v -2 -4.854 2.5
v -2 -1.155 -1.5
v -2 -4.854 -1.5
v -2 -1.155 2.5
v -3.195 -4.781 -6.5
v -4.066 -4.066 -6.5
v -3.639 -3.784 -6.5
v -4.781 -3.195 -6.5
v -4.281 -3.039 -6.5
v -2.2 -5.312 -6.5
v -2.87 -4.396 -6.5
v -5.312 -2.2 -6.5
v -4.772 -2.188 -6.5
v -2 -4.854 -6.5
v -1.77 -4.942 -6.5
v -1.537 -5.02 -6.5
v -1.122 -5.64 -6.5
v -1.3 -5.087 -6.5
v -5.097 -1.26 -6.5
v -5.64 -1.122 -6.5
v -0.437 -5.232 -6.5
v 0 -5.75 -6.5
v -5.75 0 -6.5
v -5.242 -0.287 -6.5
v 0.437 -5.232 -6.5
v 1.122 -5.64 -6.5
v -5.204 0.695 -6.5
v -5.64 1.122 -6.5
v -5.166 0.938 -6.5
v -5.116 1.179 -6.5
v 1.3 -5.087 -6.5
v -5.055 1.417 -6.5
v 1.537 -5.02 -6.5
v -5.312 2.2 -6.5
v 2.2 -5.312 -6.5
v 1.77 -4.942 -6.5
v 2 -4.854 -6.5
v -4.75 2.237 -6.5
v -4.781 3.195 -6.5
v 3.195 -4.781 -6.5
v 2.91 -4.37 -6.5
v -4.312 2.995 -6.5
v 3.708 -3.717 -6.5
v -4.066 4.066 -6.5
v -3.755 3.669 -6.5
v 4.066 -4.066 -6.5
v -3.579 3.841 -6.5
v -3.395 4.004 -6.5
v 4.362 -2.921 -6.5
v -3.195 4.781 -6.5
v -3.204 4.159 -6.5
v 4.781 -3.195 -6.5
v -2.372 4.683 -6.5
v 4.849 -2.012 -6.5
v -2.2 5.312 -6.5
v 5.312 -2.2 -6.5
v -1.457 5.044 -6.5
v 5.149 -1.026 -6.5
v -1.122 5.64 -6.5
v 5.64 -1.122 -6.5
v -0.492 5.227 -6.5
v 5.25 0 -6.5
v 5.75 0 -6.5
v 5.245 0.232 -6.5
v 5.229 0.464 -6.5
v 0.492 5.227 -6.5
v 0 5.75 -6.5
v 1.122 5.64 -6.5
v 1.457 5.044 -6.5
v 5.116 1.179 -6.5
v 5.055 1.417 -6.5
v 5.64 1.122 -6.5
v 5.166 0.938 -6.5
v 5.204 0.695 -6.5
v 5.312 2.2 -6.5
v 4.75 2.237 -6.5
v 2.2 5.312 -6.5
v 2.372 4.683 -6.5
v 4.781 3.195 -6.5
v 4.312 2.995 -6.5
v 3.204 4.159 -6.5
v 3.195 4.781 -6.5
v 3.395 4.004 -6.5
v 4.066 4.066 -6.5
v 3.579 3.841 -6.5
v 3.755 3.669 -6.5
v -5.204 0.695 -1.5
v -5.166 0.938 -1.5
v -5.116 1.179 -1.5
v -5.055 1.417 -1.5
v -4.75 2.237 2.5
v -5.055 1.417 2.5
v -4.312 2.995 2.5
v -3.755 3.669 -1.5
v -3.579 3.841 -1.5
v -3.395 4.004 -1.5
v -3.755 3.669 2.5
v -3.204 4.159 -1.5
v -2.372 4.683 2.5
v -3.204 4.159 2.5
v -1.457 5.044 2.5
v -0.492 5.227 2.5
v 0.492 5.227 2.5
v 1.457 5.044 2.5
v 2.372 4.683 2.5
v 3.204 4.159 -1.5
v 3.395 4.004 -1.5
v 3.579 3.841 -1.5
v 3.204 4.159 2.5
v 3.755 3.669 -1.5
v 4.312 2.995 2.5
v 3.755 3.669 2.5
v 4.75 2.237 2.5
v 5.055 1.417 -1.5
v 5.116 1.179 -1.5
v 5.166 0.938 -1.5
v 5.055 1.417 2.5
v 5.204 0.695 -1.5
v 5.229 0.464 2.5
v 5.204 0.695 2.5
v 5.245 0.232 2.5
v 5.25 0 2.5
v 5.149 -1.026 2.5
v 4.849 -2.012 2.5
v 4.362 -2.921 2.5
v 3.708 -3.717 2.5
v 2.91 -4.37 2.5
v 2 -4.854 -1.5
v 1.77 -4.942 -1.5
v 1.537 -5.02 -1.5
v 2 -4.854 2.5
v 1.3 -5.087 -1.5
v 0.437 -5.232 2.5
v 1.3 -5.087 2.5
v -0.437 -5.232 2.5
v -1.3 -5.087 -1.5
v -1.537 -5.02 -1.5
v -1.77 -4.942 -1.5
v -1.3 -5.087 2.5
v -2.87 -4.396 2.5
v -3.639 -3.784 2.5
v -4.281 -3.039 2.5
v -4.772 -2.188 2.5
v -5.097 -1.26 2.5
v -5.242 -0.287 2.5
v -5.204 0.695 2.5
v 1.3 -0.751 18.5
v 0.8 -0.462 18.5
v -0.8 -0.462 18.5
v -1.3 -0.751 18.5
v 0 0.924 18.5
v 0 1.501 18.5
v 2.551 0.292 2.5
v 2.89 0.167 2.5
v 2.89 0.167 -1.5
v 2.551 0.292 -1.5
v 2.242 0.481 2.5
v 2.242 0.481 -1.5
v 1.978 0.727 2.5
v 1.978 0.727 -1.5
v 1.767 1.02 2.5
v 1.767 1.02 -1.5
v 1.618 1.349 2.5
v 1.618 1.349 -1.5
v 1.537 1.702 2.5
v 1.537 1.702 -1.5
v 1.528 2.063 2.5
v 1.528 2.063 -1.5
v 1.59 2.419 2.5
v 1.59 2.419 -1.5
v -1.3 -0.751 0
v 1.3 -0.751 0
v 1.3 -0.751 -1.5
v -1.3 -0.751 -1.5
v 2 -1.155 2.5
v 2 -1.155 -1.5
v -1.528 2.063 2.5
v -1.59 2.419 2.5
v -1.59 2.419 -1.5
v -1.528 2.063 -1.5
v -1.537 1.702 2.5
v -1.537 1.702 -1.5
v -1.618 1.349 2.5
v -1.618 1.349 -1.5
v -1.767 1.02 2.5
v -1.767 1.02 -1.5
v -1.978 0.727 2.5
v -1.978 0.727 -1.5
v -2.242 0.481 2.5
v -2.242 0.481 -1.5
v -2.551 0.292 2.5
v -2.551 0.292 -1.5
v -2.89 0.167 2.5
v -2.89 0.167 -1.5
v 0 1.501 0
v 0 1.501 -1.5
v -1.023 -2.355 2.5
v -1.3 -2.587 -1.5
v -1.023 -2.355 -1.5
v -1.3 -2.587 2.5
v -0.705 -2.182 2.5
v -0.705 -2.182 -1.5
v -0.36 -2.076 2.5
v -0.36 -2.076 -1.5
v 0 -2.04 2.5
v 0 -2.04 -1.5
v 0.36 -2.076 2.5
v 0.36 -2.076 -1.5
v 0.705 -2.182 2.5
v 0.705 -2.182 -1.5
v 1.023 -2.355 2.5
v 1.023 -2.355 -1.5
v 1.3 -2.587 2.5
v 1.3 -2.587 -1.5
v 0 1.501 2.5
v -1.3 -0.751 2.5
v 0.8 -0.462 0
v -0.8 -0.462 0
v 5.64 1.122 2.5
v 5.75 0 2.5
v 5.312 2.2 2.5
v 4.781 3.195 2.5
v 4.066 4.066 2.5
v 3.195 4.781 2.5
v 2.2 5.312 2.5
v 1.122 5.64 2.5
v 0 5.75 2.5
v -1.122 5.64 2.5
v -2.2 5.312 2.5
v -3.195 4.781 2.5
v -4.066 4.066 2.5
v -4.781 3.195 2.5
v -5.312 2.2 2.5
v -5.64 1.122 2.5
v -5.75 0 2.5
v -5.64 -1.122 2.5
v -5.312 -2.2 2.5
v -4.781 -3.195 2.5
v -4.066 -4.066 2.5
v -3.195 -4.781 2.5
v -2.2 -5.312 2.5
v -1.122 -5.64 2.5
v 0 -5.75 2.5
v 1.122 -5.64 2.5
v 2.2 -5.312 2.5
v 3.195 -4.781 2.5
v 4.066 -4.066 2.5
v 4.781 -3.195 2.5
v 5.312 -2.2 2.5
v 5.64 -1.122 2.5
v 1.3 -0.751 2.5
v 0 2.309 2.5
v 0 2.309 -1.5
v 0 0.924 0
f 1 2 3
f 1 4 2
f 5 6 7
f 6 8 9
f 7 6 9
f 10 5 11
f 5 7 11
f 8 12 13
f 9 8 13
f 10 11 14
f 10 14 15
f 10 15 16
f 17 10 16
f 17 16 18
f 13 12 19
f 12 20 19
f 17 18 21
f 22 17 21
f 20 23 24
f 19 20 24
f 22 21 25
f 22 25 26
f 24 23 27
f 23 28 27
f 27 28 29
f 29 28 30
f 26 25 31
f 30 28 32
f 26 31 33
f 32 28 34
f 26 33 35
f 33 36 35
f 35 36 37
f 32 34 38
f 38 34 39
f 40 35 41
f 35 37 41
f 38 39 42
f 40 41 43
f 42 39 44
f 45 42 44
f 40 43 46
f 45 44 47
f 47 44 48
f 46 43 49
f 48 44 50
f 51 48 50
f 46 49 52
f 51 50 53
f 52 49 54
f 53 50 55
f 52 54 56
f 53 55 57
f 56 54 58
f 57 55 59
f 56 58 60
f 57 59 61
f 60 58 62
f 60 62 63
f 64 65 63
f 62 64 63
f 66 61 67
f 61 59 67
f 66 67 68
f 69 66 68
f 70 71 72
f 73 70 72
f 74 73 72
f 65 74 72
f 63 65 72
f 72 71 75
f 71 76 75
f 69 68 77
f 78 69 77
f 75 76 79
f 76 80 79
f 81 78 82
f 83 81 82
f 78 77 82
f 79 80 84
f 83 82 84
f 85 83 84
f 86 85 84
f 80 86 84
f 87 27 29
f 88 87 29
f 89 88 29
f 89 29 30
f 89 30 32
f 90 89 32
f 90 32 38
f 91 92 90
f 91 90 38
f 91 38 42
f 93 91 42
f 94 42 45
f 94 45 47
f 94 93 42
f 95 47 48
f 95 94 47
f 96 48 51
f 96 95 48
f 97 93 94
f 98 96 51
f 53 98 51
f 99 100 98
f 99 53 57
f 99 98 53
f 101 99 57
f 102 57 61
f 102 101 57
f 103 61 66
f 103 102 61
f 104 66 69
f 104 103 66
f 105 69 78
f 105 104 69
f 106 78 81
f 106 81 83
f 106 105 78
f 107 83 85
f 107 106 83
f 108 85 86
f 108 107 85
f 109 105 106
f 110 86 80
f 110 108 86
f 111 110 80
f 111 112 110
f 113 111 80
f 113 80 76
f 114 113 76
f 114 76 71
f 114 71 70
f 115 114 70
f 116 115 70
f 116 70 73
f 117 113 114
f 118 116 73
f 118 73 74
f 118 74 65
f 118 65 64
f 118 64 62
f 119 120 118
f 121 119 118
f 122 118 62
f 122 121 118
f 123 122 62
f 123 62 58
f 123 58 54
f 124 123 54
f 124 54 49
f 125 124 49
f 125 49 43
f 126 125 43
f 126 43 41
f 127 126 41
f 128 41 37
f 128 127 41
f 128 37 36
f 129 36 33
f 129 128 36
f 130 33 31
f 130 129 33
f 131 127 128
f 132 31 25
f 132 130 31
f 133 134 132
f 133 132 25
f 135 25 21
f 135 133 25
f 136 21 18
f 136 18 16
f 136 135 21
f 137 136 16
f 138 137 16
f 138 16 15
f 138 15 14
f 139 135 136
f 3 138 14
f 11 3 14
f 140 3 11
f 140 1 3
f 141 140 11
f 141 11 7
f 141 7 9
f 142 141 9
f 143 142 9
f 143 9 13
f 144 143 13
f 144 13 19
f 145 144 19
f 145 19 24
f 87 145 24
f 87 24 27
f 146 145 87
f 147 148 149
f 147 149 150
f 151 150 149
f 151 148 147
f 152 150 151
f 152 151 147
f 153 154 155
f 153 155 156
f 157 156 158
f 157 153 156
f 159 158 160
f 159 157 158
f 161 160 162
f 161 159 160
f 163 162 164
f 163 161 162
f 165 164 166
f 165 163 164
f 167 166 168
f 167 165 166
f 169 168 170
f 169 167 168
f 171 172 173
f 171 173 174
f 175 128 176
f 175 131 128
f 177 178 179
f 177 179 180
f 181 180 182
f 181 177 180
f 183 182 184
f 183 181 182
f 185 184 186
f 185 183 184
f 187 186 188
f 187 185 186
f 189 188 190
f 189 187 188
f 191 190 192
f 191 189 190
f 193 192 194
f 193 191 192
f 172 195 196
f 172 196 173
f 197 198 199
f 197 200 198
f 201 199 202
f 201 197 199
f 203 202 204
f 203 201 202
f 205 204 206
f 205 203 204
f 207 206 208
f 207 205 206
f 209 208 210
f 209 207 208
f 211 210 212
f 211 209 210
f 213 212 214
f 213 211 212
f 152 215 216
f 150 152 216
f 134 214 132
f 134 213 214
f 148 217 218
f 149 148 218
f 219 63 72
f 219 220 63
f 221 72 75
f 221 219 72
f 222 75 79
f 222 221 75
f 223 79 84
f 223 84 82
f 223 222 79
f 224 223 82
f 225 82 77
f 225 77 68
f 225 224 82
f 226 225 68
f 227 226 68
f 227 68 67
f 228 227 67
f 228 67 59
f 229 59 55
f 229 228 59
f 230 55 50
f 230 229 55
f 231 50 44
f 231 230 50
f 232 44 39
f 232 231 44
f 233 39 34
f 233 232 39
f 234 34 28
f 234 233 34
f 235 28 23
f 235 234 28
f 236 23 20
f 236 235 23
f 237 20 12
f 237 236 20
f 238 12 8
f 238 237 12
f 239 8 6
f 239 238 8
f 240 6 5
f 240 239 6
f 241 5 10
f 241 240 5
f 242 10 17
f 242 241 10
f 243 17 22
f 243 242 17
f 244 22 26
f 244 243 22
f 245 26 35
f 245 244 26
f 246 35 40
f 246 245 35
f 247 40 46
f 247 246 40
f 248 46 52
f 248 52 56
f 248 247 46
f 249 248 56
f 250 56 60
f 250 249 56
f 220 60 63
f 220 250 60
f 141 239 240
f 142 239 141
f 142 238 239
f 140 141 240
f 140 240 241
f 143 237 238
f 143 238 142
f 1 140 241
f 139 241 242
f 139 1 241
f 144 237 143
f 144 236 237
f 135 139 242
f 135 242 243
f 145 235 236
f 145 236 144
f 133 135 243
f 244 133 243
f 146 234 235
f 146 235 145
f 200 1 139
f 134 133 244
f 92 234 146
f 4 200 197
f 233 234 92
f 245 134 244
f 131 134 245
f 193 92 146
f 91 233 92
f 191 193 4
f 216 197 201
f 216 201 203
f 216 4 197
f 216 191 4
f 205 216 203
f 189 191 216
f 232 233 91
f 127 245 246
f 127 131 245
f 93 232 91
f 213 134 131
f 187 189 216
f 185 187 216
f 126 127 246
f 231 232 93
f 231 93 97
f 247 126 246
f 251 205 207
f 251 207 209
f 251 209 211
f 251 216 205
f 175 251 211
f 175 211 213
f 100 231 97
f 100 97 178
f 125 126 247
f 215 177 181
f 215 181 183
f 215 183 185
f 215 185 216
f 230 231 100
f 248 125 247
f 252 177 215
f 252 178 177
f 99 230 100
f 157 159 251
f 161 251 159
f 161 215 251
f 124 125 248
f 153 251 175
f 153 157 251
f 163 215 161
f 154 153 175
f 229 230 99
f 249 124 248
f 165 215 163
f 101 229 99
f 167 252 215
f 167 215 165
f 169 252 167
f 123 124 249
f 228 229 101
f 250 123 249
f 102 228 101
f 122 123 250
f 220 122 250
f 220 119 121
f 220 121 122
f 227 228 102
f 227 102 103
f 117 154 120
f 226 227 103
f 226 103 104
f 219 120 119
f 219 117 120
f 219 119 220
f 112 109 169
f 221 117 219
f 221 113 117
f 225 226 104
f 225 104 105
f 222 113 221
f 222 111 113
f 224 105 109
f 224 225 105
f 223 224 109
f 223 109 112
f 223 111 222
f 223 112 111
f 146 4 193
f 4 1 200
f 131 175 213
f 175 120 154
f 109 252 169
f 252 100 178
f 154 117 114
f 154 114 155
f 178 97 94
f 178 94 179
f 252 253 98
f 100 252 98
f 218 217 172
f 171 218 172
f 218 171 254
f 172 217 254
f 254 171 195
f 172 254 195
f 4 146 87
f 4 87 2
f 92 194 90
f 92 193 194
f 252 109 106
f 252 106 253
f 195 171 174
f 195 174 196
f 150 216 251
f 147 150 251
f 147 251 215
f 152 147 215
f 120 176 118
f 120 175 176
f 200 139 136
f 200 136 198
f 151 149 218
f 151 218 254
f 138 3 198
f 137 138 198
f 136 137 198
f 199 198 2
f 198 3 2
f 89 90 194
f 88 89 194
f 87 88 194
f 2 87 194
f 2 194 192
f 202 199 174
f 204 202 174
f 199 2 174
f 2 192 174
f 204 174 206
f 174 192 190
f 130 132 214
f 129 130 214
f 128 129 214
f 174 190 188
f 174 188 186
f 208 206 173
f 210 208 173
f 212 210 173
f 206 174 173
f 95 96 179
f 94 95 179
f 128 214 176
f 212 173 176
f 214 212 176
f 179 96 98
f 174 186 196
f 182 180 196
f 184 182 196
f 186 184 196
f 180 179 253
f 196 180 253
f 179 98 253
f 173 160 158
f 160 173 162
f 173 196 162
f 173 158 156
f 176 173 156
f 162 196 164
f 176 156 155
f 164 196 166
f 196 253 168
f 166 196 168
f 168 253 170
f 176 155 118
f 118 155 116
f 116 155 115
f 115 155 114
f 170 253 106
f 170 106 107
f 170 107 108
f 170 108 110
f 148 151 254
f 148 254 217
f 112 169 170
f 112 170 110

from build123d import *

# Parameters (mm, degrees)
F0_R     = 5.75
F1_DEPTH = 2.5
F2_DEPTH = 18.5
F3_DEPTH = 6.5
F4_DEPTH = 1.5


with BuildPart() as f1:
    # F0 (on Top) → F1 (new body)
    with BuildSketch(Plane.XY):
        Circle(F0_R)
        with BuildLine():
            ThreePointArc((5.2037929302, 0.6950101723), (5.2384354956, 0.3482722473), (5.25, 0))
            ThreePointArc((5.25, 0), (4.3624820917, -2.9208303614), (2, -4.8541219597))
            ThreePointArc((2, -4.8541219597), (1.6540858778, -4.9826197837), (1.3, -5.0865017448))
            ThreePointArc((1.3, -5.0865017448), (0, -5.25), (-1.3, -5.0865017448))
            ThreePointArc((-1.3, -5.0865017448), (-1.6540858778, -4.9826197837), (-2, -4.8541219597))
            ThreePointArc((-2, -4.8541219597), (-4.5466333699, -2.625), (-5.2037929302, 0.6950101723))
            ThreePointArc((-5.2037929302, 0.6950101723), (-5.142118249, 1.0588295016), (-5.0550397274, 1.4174178475))
            ThreePointArc((-5.0550397274, 1.4174178475), (-4.5466333699, 2.625), (-3.7550397274, 3.6690838973))
            ThreePointArc((-3.7550397274, 3.6690838973), (-3.4880323712, 3.9237902821), (-3.2037929302, 4.1591117874))
            ThreePointArc((-3.2037929302, 4.1591117874), (0, 5.25), (3.2037929302, 4.1591117874))
            ThreePointArc((3.2037929302, 4.1591117874), (3.4880323712, 3.9237902821), (3.7550397274, 3.6690838973))
            ThreePointArc((3.7550397274, 3.6690838973), (4.5466333699, 2.625), (5.0550397274, 1.4174178475))
            ThreePointArc((5.0550397274, 1.4174178475), (5.142118249, 1.0588295016), (5.2037929302, 0.6950101723))
        make_face(mode=Mode.SUBTRACT)
        with BuildLine():
            Line((2, -1.1547005384), (5.2037929302, 0.6950101723))
            ThreePointArc((5.2037929302, 0.6950101723), (5.142118249, 1.0588295016), (5.0550397274, 1.4174178475))
            Line((5.0550397274, 1.4174178475), (2.8899762179, 0.1674178475))
            ThreePointArc((2.8899762179, 0.1674178475), (1.7668965617, 1.0201182055), (1.5899762179, 2.4190838973))
            Line((1.5899762179, 2.4190838973), (3.7550397274, 3.6690838973))
            ThreePointArc((3.7550397274, 3.6690838973), (3.4880323712, 3.9237902821), (3.2037929302, 4.1591117874))
            Line((3.2037929302, 4.1591117874), (0, 2.3094010768))
            Line((0, 2.3094010768), (-3.2037929302, 4.1591117874))
            ThreePointArc((-3.2037929302, 4.1591117874), (-3.4880323712, 3.9237902821), (-3.7550397274, 3.6690838973))
            Line((-3.7550397274, 3.6690838973), (-1.5899762179, 2.4190838973))
            ThreePointArc((-1.5899762179, 2.4190838973), (-1.7668965617, 1.0201182055), (-2.8899762179, 0.1674178475))
            Line((-2.8899762179, 0.1674178475), (-5.0550397274, 1.4174178475))
            ThreePointArc((-5.0550397274, 1.4174178475), (-5.142118249, 1.0588295016), (-5.2037929302, 0.6950101723))
            Line((-5.2037929302, 0.6950101723), (-2, -1.1547005384))
            Line((-2, -1.1547005384), (-2, -4.8541219597))
            ThreePointArc((-2, -4.8541219597), (-1.6540858778, -4.9826197837), (-1.3, -5.0865017448))
            Line((-1.3, -5.0865017448), (-1.3, -2.5865017448))
            ThreePointArc((-1.3, -2.5865017448), (0, -2.0402364111), (1.3, -2.5865017448))
            Line((1.3, -2.5865017448), (1.3, -5.0865017448))
            ThreePointArc((1.3, -5.0865017448), (1.6540858778, -4.9826197837), (2, -4.8541219597))
            Line((2, -4.8541219597), (2, -1.1547005384))
        make_face()
        Polygon((-1.3, -0.7505553499), (0, 1.5011106999), (1.3, -0.7505553499), align=None, mode=Mode.SUBTRACT)
    extrude(amount=F1_DEPTH)

    # F0 (on Top) → F2 (join)
    with BuildSketch(Plane.XY):
        Polygon((1.3, -0.7505553499), (0, 1.5011106999), (-1.3, -0.7505553499), align=None)
        Polygon((-0.8, -0.4618802154), (0, 0.9237604307), (0.8, -0.4618802154), align=None, mode=Mode.SUBTRACT)
    extrude(amount=F2_DEPTH)

    # F0 (on Top) → F3 (join)
    with BuildSketch(Plane.XY):
        Circle(F0_R)
        with BuildLine():
            ThreePointArc((5.2037929302, 0.6950101723), (5.2384354956, 0.3482722473), (5.25, 0))
            ThreePointArc((5.25, 0), (4.3624820917, -2.9208303614), (2, -4.8541219597))
            ThreePointArc((2, -4.8541219597), (1.6540858778, -4.9826197837), (1.3, -5.0865017448))
            ThreePointArc((1.3, -5.0865017448), (0, -5.25), (-1.3, -5.0865017448))
            ThreePointArc((-1.3, -5.0865017448), (-1.6540858778, -4.9826197837), (-2, -4.8541219597))
            ThreePointArc((-2, -4.8541219597), (-4.5466333699, -2.625), (-5.2037929302, 0.6950101723))
            ThreePointArc((-5.2037929302, 0.6950101723), (-5.142118249, 1.0588295016), (-5.0550397274, 1.4174178475))
            ThreePointArc((-5.0550397274, 1.4174178475), (-4.5466333699, 2.625), (-3.7550397274, 3.6690838973))
            ThreePointArc((-3.7550397274, 3.6690838973), (-3.4880323712, 3.9237902821), (-3.2037929302, 4.1591117874))
            ThreePointArc((-3.2037929302, 4.1591117874), (0, 5.25), (3.2037929302, 4.1591117874))
            ThreePointArc((3.2037929302, 4.1591117874), (3.4880323712, 3.9237902821), (3.7550397274, 3.6690838973))
            ThreePointArc((3.7550397274, 3.6690838973), (4.5466333699, 2.625), (5.0550397274, 1.4174178475))
            ThreePointArc((5.0550397274, 1.4174178475), (5.142118249, 1.0588295016), (5.2037929302, 0.6950101723))
        make_face(mode=Mode.SUBTRACT)
    extrude(amount=-F3_DEPTH)

    # F0 (on Top) → F4 (join)
    with BuildSketch(Plane.XY):
        with BuildLine():
            Line((2, -1.1547005384), (5.2037929302, 0.6950101723))
            ThreePointArc((5.2037929302, 0.6950101723), (5.142118249, 1.0588295016), (5.0550397274, 1.4174178475))
            Line((5.0550397274, 1.4174178475), (2.8899762179, 0.1674178475))
            ThreePointArc((2.8899762179, 0.1674178475), (1.7668965617, 1.0201182055), (1.5899762179, 2.4190838973))
            Line((1.5899762179, 2.4190838973), (3.7550397274, 3.6690838973))
            ThreePointArc((3.7550397274, 3.6690838973), (3.4880323712, 3.9237902821), (3.2037929302, 4.1591117874))
            Line((3.2037929302, 4.1591117874), (0, 2.3094010768))
            Line((0, 2.3094010768), (-3.2037929302, 4.1591117874))
            ThreePointArc((-3.2037929302, 4.1591117874), (-3.4880323712, 3.9237902821), (-3.7550397274, 3.6690838973))
            Line((-3.7550397274, 3.6690838973), (-1.5899762179, 2.4190838973))
            ThreePointArc((-1.5899762179, 2.4190838973), (-1.7668965617, 1.0201182055), (-2.8899762179, 0.1674178475))
            Line((-2.8899762179, 0.1674178475), (-5.0550397274, 1.4174178475))
            ThreePointArc((-5.0550397274, 1.4174178475), (-5.142118249, 1.0588295016), (-5.2037929302, 0.6950101723))
            Line((-5.2037929302, 0.6950101723), (-2, -1.1547005384))
            Line((-2, -1.1547005384), (-2, -4.8541219597))
            ThreePointArc((-2, -4.8541219597), (-1.6540858778, -4.9826197837), (-1.3, -5.0865017448))
            Line((-1.3, -5.0865017448), (-1.3, -2.5865017448))
            ThreePointArc((-1.3, -2.5865017448), (0, -2.0402364111), (1.3, -2.5865017448))
            Line((1.3, -2.5865017448), (1.3, -5.0865017448))
            ThreePointArc((1.3, -5.0865017448), (1.6540858778, -4.9826197837), (2, -4.8541219597))
            Line((2, -4.8541219597), (2, -1.1547005384))
        make_face()
        Polygon((-1.3, -0.7505553499), (0, 1.5011106999), (1.3, -0.7505553499), align=None, mode=Mode.SUBTRACT)
    extrude(amount=-F4_DEPTH)


solid = f1.part
